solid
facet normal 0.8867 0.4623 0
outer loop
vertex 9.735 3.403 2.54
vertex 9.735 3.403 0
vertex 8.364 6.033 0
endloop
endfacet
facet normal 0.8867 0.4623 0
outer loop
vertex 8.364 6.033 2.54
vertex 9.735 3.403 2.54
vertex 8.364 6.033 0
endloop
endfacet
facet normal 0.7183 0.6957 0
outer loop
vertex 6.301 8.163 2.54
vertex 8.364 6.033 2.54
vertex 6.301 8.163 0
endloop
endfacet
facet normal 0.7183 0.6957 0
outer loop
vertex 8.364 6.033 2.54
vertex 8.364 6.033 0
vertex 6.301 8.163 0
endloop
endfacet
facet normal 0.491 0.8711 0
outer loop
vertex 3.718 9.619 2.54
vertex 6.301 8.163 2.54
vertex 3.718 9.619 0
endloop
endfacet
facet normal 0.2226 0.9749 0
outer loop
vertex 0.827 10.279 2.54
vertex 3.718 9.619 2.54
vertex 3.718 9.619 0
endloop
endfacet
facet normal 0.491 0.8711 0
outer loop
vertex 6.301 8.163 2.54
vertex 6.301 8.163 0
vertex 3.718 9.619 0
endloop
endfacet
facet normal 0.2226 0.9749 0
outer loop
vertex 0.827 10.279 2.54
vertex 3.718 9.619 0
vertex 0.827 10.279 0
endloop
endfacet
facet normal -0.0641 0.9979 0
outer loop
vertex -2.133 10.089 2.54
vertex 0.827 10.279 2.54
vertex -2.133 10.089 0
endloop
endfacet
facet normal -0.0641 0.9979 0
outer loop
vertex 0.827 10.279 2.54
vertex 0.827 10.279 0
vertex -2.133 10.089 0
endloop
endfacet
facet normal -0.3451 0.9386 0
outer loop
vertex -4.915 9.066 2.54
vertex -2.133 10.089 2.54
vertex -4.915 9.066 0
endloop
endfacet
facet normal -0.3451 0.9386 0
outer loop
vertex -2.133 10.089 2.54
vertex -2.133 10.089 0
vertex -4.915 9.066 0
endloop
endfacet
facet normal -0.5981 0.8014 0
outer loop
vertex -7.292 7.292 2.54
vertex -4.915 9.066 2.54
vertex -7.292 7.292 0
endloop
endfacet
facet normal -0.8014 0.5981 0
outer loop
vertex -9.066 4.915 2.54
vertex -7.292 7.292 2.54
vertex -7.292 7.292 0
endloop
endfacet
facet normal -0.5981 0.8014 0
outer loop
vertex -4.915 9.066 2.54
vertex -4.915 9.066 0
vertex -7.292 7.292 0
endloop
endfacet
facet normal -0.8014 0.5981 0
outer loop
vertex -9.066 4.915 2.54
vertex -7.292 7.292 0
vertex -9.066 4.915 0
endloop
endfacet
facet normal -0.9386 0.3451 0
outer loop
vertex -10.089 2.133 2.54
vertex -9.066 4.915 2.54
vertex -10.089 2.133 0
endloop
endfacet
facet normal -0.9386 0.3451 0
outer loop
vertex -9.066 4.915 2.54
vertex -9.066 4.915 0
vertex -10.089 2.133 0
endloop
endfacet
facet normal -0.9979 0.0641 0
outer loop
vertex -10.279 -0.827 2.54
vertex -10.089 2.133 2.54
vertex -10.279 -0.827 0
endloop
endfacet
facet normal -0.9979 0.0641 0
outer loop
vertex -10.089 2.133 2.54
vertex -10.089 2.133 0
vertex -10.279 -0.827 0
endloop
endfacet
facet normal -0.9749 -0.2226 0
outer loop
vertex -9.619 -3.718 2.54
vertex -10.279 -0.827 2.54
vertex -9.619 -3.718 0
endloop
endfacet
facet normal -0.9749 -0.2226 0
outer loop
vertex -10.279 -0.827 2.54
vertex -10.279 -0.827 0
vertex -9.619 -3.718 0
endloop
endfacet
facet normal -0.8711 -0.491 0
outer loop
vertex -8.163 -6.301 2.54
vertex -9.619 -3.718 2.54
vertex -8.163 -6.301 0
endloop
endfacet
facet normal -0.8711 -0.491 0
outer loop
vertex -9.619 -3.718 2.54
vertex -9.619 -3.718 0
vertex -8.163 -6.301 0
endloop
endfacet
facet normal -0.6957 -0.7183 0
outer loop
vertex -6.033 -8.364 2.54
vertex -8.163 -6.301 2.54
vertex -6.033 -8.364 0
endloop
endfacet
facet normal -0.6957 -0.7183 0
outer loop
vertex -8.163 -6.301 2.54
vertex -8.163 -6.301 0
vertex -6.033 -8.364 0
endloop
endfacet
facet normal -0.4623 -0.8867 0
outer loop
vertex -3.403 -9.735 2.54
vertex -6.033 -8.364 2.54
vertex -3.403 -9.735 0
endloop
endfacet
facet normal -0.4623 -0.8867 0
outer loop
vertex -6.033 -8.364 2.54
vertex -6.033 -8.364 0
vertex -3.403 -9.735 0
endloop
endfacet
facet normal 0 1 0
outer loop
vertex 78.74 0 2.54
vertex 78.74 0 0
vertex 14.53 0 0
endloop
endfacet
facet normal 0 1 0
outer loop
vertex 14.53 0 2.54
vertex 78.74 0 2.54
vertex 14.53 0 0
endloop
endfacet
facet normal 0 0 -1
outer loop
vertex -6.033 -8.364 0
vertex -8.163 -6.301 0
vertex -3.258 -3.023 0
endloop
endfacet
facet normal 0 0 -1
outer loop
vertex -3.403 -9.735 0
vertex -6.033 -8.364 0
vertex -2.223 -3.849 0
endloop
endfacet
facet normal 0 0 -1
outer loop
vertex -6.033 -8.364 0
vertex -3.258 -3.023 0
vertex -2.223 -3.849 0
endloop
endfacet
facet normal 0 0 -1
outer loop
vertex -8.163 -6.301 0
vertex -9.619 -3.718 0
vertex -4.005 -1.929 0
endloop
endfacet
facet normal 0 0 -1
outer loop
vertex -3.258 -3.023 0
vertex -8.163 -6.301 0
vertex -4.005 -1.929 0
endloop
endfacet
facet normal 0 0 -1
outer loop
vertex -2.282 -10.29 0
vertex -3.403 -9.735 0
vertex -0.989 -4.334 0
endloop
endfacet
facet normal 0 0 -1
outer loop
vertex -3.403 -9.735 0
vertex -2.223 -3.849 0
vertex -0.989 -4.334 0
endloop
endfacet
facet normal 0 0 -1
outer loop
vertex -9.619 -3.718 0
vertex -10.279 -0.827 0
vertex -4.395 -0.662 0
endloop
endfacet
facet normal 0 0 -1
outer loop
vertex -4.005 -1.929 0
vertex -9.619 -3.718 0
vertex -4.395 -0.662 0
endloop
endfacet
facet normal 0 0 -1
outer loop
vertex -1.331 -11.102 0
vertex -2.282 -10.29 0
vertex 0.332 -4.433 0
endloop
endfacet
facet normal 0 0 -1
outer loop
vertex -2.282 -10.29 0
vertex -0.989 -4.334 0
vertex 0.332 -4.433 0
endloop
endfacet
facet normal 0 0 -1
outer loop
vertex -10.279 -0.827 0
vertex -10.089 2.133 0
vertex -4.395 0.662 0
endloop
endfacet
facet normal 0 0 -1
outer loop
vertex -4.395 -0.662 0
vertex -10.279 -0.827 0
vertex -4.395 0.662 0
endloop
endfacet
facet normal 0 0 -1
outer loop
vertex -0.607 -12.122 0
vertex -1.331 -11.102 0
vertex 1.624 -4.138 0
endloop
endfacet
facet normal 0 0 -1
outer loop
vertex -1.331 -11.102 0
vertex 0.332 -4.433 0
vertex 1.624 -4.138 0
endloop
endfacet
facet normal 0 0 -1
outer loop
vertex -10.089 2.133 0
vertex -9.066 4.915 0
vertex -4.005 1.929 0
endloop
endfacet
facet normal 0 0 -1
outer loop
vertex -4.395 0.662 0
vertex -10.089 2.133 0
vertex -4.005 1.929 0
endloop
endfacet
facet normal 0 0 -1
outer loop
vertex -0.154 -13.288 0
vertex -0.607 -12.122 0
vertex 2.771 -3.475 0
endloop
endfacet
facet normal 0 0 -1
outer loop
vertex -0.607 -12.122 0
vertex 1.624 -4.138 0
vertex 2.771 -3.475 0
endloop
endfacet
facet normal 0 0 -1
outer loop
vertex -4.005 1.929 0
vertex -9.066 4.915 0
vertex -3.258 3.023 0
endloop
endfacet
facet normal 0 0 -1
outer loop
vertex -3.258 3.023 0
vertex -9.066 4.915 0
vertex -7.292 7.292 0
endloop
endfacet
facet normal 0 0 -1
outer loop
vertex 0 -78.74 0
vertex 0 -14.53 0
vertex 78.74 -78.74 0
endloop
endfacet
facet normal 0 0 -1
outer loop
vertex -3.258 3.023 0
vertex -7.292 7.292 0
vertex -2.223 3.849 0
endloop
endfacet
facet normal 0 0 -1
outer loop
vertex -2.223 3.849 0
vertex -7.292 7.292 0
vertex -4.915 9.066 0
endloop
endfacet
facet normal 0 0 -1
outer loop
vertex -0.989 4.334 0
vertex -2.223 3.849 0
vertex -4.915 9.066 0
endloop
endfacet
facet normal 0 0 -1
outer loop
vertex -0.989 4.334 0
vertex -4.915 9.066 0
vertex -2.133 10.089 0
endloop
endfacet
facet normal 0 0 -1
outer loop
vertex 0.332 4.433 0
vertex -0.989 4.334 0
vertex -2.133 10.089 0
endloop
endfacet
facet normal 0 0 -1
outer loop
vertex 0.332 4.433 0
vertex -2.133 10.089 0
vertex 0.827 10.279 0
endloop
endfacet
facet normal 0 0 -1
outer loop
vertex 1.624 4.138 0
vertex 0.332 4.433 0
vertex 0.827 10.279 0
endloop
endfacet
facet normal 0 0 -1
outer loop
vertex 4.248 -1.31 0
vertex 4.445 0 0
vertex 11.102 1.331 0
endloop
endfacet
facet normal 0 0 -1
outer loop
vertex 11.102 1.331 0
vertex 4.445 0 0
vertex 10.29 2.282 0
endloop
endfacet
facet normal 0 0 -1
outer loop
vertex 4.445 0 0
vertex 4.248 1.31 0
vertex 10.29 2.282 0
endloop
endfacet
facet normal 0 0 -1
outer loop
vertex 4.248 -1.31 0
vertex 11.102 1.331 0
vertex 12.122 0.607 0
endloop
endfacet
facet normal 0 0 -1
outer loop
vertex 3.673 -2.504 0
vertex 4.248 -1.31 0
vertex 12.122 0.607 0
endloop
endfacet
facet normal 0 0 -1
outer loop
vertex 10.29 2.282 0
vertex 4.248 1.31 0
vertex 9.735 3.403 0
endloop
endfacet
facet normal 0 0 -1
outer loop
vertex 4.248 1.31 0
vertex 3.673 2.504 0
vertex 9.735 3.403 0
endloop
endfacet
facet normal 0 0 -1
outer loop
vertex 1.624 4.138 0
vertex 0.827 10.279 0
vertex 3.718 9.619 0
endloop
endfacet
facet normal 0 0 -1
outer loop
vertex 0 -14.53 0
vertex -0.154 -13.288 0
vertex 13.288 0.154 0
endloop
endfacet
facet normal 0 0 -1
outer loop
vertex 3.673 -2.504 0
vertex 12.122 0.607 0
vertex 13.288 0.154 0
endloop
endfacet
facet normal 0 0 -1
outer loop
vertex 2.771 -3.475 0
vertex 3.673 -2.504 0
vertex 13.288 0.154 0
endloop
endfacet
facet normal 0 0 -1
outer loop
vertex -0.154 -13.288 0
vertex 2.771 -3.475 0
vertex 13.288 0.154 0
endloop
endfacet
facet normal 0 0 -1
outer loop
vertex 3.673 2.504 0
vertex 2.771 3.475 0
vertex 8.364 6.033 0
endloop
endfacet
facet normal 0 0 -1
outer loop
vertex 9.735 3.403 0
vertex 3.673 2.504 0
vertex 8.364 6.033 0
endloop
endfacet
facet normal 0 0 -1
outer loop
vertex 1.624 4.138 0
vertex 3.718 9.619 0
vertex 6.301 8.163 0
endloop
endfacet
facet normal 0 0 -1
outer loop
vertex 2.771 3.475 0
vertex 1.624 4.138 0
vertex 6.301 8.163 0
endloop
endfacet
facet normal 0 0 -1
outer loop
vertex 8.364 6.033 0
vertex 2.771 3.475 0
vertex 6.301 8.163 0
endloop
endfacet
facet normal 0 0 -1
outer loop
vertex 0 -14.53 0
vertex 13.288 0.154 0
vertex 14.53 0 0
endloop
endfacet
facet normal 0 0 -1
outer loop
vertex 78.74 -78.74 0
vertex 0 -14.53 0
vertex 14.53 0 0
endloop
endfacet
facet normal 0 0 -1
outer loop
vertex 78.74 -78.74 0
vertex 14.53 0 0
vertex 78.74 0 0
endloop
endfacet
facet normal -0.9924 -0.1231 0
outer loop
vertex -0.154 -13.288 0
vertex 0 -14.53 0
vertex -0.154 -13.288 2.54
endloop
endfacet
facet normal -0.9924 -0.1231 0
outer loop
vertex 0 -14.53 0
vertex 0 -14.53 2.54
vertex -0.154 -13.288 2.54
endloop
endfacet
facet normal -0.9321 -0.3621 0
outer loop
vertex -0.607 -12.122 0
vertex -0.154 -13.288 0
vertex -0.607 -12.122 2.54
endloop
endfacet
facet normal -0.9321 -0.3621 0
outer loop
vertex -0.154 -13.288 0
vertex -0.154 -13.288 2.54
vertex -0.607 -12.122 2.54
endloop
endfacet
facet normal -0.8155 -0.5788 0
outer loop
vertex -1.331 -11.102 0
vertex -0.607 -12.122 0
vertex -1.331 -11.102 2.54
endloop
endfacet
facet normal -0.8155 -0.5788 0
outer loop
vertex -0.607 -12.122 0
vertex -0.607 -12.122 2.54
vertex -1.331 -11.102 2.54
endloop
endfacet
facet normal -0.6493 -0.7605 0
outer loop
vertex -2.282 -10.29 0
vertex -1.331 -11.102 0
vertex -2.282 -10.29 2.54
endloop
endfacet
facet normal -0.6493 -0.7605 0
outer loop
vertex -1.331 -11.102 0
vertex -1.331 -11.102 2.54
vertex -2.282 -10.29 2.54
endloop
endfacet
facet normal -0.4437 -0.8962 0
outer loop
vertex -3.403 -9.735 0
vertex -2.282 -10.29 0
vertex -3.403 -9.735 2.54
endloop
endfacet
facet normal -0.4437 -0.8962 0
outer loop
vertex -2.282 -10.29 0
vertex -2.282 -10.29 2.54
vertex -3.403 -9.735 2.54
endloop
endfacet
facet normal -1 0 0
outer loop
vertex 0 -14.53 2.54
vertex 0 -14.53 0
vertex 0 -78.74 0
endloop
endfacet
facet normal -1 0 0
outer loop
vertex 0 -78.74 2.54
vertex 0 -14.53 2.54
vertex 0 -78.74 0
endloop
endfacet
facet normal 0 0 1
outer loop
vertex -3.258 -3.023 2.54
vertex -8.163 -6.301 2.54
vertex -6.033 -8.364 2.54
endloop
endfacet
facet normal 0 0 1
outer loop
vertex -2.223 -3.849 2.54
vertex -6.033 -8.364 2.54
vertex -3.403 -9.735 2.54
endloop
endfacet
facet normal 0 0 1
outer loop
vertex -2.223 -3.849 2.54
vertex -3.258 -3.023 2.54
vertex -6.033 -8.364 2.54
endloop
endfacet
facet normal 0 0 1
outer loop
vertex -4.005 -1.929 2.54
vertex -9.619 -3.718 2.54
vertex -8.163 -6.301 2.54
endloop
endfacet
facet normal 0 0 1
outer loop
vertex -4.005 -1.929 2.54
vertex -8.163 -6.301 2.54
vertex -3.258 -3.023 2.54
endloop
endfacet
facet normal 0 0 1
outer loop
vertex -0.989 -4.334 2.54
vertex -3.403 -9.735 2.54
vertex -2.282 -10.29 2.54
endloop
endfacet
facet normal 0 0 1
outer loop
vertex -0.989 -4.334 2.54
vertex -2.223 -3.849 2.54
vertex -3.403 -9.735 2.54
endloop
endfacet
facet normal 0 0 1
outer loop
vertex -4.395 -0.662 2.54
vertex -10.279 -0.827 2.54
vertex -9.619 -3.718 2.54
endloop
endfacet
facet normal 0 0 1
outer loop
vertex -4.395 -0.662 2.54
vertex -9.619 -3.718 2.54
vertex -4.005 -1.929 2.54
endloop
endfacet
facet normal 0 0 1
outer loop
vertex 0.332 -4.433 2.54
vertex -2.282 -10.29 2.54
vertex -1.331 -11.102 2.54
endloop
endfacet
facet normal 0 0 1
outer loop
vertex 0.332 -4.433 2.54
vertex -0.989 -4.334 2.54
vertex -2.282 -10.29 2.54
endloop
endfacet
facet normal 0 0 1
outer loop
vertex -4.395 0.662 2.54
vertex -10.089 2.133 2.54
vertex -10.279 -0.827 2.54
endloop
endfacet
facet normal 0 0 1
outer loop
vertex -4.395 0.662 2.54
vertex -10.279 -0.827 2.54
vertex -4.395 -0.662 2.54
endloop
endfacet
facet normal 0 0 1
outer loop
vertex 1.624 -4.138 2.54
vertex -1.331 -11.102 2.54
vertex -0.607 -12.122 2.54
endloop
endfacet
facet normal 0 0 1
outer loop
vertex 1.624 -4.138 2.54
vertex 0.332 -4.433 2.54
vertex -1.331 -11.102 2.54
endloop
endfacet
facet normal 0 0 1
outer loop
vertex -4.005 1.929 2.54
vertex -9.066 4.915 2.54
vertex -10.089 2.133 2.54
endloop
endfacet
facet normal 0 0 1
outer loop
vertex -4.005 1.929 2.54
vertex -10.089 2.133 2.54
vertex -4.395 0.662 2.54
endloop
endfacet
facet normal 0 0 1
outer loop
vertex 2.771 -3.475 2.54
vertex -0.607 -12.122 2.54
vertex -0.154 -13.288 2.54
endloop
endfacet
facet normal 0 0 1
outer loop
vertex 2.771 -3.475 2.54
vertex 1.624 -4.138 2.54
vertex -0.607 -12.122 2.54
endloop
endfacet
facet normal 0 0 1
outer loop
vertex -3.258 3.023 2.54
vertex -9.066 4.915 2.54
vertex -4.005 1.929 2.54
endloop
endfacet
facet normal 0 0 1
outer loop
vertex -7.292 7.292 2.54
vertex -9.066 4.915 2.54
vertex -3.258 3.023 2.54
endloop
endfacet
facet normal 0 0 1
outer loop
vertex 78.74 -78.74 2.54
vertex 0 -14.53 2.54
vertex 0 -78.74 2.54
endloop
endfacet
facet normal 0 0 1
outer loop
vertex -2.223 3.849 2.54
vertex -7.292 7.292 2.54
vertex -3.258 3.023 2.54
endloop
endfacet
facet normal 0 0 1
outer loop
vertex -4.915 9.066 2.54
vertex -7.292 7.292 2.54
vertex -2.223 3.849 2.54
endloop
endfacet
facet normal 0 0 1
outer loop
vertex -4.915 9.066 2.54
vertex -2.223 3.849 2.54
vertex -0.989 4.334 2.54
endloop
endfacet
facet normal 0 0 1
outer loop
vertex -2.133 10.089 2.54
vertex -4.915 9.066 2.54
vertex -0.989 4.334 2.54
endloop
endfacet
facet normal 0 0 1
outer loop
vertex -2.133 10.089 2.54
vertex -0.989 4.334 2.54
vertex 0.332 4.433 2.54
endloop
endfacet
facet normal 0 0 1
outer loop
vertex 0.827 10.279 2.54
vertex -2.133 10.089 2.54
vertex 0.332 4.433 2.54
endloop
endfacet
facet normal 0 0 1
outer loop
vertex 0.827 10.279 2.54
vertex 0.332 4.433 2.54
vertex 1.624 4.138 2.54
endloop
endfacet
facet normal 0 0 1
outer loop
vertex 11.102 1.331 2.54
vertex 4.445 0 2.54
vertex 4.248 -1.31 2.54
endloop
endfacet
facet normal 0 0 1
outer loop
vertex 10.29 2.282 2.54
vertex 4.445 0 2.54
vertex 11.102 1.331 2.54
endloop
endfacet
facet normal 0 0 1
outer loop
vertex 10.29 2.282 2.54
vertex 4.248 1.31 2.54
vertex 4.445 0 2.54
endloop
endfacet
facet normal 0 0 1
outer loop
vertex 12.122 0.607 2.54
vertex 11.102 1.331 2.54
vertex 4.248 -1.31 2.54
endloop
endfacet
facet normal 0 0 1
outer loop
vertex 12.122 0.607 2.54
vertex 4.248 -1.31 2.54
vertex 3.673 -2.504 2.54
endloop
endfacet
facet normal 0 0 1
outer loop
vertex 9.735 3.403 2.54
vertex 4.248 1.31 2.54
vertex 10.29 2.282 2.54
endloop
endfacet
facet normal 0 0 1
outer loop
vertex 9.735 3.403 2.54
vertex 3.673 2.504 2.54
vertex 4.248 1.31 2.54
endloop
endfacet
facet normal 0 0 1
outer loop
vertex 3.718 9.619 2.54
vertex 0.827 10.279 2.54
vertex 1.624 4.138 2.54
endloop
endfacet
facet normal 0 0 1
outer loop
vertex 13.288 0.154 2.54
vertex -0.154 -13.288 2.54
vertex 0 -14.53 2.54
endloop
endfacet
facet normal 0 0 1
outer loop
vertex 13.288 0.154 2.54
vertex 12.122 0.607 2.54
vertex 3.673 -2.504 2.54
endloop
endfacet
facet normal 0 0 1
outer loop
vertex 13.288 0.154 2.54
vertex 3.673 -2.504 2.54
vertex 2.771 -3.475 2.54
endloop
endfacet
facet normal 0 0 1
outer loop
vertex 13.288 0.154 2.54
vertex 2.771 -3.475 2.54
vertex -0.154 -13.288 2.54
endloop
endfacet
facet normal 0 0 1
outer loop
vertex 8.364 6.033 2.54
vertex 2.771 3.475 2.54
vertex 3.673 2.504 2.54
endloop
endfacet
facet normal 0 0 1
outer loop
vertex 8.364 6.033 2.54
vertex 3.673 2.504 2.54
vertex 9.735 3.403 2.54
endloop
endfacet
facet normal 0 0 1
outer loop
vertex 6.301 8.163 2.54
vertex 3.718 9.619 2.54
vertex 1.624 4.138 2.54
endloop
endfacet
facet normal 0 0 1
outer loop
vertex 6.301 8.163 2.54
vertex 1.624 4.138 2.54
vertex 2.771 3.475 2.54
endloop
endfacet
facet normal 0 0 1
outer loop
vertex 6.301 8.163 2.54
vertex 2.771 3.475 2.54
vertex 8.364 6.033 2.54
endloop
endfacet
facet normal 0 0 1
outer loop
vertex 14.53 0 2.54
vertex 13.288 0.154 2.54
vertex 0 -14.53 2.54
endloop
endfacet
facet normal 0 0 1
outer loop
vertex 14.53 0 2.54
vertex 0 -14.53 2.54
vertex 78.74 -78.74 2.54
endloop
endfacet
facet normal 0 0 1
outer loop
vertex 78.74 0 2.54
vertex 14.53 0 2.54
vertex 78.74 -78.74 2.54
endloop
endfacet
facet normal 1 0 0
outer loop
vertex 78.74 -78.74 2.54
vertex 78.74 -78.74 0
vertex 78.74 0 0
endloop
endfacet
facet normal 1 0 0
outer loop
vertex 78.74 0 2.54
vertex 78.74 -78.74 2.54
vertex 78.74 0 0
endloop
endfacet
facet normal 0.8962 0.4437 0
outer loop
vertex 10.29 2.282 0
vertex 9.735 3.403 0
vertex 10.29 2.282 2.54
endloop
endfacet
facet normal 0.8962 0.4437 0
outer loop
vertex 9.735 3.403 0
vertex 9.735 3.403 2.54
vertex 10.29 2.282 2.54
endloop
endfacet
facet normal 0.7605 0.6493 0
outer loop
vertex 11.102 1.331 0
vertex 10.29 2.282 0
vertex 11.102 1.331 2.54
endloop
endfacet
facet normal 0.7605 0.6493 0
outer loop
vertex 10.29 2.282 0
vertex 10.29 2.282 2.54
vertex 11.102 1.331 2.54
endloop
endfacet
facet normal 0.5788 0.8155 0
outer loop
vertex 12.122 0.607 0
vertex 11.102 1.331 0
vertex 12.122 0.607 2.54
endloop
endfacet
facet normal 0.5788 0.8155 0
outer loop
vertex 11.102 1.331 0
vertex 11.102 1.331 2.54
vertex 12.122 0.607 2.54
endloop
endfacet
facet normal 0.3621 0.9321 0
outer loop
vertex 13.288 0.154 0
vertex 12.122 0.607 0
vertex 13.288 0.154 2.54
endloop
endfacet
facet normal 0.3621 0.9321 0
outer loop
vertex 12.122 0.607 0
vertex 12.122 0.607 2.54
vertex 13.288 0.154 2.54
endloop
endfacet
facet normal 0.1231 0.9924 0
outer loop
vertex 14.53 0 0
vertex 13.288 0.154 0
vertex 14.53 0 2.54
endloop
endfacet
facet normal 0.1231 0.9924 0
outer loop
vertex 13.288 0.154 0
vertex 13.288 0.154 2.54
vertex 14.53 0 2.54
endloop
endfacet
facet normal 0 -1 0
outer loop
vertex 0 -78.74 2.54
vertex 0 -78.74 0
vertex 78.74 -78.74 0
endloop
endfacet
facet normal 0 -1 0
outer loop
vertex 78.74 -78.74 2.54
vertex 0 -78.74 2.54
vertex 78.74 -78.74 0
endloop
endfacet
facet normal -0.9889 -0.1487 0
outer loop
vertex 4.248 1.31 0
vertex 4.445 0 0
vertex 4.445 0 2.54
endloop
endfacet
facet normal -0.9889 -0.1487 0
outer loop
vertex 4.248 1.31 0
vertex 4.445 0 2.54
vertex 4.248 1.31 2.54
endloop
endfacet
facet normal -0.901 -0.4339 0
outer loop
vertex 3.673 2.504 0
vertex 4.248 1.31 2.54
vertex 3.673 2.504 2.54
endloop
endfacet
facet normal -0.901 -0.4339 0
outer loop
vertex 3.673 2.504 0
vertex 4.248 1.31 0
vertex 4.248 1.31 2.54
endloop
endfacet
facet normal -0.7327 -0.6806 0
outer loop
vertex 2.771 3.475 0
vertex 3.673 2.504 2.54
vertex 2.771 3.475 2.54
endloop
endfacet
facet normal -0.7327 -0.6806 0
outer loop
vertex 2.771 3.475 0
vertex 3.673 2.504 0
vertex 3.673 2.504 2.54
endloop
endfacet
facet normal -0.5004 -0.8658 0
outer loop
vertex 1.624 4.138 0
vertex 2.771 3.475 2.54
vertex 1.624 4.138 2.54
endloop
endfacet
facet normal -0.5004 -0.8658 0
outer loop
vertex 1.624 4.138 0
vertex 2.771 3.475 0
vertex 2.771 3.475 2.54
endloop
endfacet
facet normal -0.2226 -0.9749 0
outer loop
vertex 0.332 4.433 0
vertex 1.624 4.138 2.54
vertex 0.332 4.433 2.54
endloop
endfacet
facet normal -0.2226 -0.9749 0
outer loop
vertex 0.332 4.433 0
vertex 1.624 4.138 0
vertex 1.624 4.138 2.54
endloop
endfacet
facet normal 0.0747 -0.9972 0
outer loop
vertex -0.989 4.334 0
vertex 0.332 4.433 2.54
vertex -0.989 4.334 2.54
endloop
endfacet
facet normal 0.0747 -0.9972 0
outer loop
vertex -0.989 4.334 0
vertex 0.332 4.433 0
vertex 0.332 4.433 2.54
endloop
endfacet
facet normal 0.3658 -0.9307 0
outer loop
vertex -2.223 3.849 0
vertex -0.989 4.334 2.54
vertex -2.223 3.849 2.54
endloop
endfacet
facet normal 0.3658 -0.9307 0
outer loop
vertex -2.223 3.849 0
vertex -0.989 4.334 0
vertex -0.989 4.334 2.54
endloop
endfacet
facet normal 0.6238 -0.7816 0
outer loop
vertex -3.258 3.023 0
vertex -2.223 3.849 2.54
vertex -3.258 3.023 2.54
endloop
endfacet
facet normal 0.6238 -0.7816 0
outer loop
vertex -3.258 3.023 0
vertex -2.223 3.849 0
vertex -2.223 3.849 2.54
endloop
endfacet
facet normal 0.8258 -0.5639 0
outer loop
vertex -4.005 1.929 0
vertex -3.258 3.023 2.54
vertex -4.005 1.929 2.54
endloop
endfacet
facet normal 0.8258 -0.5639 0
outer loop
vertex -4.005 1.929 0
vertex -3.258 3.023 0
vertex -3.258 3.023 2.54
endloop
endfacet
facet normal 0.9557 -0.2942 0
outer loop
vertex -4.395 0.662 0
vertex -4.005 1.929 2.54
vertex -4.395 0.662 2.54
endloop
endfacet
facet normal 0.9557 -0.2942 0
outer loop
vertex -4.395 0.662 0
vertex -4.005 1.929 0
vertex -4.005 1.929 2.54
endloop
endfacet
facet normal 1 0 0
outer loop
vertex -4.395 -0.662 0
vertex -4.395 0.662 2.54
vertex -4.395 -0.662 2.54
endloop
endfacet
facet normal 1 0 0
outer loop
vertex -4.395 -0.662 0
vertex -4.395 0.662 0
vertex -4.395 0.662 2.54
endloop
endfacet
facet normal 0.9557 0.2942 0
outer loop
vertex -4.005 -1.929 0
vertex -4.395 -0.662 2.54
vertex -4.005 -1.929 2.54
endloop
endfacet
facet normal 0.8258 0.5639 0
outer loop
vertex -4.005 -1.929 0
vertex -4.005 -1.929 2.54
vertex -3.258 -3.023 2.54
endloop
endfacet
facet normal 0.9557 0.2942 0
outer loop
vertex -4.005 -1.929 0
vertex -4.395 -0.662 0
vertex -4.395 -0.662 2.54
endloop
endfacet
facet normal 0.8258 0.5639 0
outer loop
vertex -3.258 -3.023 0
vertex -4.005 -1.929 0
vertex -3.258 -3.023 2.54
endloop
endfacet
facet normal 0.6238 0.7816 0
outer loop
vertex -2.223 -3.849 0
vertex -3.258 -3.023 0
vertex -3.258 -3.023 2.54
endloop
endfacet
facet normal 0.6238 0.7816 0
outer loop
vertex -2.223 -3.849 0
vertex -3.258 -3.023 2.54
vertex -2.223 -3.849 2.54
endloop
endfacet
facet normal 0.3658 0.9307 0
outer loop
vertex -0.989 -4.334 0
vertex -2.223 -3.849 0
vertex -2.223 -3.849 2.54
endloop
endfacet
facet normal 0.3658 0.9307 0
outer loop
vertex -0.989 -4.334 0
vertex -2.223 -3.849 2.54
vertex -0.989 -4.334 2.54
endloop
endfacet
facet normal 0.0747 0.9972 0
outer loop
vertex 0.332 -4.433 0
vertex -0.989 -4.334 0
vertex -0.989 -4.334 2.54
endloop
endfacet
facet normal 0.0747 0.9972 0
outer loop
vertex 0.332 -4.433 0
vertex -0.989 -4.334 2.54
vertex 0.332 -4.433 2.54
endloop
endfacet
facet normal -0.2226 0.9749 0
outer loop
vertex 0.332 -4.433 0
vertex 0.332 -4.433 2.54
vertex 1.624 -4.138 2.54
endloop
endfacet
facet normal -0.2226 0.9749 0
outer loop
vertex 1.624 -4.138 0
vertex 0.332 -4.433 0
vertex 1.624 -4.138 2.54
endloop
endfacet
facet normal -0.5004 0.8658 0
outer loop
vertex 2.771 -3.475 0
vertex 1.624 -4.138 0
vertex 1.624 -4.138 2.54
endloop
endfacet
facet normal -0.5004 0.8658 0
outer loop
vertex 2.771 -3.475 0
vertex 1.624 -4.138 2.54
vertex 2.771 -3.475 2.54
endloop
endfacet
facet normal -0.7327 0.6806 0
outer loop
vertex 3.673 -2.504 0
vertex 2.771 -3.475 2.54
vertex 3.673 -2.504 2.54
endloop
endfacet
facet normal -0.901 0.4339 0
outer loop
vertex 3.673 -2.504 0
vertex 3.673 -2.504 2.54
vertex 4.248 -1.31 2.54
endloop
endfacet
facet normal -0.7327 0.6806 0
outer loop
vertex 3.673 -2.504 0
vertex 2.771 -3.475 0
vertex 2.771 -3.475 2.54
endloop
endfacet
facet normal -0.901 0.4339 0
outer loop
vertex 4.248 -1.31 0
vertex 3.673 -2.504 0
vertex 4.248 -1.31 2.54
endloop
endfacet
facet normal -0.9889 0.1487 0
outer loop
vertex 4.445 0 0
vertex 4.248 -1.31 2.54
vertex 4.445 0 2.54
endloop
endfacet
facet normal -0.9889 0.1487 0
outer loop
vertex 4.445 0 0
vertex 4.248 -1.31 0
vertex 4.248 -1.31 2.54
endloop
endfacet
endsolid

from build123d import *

# Parameters (mm, degrees)
SKETCH1_R           = 4.445
BOSS_EXTRUDE1_DEPTH = 2.54
FILLET1_R           = 5.08


with BuildPart() as part:
    # Sketch1 → Boss-Extrude1 (new body)
    with BuildSketch(Plane.XY):
        with BuildLine():
            Line((0, -10.3124), (0, -78.74))
            Line((0, -78.74), (78.74, -78.74))
            Line((78.74, -78.74), (78.74, 0))
            Line((78.74, 0), (10.3124, 0))
            ThreePointArc((10.3124, 0), (-7.29196797, 7.29196797), (0, -10.3124))
        make_face()
        Circle(SKETCH1_R, mode=Mode.SUBTRACT)
    extrude(amount=BOSS_EXTRUDE1_DEPTH)

    # Fillet1
    fillet1_edges = [part.edges().sort_by_distance(p)[0] for p in [
        (0, -10.3124, 1.27),
        (10.3124, 0, 1.27),
    ]]
    fillet(fillet1_edges, radius=FILLET1_R)


solid = part.part
